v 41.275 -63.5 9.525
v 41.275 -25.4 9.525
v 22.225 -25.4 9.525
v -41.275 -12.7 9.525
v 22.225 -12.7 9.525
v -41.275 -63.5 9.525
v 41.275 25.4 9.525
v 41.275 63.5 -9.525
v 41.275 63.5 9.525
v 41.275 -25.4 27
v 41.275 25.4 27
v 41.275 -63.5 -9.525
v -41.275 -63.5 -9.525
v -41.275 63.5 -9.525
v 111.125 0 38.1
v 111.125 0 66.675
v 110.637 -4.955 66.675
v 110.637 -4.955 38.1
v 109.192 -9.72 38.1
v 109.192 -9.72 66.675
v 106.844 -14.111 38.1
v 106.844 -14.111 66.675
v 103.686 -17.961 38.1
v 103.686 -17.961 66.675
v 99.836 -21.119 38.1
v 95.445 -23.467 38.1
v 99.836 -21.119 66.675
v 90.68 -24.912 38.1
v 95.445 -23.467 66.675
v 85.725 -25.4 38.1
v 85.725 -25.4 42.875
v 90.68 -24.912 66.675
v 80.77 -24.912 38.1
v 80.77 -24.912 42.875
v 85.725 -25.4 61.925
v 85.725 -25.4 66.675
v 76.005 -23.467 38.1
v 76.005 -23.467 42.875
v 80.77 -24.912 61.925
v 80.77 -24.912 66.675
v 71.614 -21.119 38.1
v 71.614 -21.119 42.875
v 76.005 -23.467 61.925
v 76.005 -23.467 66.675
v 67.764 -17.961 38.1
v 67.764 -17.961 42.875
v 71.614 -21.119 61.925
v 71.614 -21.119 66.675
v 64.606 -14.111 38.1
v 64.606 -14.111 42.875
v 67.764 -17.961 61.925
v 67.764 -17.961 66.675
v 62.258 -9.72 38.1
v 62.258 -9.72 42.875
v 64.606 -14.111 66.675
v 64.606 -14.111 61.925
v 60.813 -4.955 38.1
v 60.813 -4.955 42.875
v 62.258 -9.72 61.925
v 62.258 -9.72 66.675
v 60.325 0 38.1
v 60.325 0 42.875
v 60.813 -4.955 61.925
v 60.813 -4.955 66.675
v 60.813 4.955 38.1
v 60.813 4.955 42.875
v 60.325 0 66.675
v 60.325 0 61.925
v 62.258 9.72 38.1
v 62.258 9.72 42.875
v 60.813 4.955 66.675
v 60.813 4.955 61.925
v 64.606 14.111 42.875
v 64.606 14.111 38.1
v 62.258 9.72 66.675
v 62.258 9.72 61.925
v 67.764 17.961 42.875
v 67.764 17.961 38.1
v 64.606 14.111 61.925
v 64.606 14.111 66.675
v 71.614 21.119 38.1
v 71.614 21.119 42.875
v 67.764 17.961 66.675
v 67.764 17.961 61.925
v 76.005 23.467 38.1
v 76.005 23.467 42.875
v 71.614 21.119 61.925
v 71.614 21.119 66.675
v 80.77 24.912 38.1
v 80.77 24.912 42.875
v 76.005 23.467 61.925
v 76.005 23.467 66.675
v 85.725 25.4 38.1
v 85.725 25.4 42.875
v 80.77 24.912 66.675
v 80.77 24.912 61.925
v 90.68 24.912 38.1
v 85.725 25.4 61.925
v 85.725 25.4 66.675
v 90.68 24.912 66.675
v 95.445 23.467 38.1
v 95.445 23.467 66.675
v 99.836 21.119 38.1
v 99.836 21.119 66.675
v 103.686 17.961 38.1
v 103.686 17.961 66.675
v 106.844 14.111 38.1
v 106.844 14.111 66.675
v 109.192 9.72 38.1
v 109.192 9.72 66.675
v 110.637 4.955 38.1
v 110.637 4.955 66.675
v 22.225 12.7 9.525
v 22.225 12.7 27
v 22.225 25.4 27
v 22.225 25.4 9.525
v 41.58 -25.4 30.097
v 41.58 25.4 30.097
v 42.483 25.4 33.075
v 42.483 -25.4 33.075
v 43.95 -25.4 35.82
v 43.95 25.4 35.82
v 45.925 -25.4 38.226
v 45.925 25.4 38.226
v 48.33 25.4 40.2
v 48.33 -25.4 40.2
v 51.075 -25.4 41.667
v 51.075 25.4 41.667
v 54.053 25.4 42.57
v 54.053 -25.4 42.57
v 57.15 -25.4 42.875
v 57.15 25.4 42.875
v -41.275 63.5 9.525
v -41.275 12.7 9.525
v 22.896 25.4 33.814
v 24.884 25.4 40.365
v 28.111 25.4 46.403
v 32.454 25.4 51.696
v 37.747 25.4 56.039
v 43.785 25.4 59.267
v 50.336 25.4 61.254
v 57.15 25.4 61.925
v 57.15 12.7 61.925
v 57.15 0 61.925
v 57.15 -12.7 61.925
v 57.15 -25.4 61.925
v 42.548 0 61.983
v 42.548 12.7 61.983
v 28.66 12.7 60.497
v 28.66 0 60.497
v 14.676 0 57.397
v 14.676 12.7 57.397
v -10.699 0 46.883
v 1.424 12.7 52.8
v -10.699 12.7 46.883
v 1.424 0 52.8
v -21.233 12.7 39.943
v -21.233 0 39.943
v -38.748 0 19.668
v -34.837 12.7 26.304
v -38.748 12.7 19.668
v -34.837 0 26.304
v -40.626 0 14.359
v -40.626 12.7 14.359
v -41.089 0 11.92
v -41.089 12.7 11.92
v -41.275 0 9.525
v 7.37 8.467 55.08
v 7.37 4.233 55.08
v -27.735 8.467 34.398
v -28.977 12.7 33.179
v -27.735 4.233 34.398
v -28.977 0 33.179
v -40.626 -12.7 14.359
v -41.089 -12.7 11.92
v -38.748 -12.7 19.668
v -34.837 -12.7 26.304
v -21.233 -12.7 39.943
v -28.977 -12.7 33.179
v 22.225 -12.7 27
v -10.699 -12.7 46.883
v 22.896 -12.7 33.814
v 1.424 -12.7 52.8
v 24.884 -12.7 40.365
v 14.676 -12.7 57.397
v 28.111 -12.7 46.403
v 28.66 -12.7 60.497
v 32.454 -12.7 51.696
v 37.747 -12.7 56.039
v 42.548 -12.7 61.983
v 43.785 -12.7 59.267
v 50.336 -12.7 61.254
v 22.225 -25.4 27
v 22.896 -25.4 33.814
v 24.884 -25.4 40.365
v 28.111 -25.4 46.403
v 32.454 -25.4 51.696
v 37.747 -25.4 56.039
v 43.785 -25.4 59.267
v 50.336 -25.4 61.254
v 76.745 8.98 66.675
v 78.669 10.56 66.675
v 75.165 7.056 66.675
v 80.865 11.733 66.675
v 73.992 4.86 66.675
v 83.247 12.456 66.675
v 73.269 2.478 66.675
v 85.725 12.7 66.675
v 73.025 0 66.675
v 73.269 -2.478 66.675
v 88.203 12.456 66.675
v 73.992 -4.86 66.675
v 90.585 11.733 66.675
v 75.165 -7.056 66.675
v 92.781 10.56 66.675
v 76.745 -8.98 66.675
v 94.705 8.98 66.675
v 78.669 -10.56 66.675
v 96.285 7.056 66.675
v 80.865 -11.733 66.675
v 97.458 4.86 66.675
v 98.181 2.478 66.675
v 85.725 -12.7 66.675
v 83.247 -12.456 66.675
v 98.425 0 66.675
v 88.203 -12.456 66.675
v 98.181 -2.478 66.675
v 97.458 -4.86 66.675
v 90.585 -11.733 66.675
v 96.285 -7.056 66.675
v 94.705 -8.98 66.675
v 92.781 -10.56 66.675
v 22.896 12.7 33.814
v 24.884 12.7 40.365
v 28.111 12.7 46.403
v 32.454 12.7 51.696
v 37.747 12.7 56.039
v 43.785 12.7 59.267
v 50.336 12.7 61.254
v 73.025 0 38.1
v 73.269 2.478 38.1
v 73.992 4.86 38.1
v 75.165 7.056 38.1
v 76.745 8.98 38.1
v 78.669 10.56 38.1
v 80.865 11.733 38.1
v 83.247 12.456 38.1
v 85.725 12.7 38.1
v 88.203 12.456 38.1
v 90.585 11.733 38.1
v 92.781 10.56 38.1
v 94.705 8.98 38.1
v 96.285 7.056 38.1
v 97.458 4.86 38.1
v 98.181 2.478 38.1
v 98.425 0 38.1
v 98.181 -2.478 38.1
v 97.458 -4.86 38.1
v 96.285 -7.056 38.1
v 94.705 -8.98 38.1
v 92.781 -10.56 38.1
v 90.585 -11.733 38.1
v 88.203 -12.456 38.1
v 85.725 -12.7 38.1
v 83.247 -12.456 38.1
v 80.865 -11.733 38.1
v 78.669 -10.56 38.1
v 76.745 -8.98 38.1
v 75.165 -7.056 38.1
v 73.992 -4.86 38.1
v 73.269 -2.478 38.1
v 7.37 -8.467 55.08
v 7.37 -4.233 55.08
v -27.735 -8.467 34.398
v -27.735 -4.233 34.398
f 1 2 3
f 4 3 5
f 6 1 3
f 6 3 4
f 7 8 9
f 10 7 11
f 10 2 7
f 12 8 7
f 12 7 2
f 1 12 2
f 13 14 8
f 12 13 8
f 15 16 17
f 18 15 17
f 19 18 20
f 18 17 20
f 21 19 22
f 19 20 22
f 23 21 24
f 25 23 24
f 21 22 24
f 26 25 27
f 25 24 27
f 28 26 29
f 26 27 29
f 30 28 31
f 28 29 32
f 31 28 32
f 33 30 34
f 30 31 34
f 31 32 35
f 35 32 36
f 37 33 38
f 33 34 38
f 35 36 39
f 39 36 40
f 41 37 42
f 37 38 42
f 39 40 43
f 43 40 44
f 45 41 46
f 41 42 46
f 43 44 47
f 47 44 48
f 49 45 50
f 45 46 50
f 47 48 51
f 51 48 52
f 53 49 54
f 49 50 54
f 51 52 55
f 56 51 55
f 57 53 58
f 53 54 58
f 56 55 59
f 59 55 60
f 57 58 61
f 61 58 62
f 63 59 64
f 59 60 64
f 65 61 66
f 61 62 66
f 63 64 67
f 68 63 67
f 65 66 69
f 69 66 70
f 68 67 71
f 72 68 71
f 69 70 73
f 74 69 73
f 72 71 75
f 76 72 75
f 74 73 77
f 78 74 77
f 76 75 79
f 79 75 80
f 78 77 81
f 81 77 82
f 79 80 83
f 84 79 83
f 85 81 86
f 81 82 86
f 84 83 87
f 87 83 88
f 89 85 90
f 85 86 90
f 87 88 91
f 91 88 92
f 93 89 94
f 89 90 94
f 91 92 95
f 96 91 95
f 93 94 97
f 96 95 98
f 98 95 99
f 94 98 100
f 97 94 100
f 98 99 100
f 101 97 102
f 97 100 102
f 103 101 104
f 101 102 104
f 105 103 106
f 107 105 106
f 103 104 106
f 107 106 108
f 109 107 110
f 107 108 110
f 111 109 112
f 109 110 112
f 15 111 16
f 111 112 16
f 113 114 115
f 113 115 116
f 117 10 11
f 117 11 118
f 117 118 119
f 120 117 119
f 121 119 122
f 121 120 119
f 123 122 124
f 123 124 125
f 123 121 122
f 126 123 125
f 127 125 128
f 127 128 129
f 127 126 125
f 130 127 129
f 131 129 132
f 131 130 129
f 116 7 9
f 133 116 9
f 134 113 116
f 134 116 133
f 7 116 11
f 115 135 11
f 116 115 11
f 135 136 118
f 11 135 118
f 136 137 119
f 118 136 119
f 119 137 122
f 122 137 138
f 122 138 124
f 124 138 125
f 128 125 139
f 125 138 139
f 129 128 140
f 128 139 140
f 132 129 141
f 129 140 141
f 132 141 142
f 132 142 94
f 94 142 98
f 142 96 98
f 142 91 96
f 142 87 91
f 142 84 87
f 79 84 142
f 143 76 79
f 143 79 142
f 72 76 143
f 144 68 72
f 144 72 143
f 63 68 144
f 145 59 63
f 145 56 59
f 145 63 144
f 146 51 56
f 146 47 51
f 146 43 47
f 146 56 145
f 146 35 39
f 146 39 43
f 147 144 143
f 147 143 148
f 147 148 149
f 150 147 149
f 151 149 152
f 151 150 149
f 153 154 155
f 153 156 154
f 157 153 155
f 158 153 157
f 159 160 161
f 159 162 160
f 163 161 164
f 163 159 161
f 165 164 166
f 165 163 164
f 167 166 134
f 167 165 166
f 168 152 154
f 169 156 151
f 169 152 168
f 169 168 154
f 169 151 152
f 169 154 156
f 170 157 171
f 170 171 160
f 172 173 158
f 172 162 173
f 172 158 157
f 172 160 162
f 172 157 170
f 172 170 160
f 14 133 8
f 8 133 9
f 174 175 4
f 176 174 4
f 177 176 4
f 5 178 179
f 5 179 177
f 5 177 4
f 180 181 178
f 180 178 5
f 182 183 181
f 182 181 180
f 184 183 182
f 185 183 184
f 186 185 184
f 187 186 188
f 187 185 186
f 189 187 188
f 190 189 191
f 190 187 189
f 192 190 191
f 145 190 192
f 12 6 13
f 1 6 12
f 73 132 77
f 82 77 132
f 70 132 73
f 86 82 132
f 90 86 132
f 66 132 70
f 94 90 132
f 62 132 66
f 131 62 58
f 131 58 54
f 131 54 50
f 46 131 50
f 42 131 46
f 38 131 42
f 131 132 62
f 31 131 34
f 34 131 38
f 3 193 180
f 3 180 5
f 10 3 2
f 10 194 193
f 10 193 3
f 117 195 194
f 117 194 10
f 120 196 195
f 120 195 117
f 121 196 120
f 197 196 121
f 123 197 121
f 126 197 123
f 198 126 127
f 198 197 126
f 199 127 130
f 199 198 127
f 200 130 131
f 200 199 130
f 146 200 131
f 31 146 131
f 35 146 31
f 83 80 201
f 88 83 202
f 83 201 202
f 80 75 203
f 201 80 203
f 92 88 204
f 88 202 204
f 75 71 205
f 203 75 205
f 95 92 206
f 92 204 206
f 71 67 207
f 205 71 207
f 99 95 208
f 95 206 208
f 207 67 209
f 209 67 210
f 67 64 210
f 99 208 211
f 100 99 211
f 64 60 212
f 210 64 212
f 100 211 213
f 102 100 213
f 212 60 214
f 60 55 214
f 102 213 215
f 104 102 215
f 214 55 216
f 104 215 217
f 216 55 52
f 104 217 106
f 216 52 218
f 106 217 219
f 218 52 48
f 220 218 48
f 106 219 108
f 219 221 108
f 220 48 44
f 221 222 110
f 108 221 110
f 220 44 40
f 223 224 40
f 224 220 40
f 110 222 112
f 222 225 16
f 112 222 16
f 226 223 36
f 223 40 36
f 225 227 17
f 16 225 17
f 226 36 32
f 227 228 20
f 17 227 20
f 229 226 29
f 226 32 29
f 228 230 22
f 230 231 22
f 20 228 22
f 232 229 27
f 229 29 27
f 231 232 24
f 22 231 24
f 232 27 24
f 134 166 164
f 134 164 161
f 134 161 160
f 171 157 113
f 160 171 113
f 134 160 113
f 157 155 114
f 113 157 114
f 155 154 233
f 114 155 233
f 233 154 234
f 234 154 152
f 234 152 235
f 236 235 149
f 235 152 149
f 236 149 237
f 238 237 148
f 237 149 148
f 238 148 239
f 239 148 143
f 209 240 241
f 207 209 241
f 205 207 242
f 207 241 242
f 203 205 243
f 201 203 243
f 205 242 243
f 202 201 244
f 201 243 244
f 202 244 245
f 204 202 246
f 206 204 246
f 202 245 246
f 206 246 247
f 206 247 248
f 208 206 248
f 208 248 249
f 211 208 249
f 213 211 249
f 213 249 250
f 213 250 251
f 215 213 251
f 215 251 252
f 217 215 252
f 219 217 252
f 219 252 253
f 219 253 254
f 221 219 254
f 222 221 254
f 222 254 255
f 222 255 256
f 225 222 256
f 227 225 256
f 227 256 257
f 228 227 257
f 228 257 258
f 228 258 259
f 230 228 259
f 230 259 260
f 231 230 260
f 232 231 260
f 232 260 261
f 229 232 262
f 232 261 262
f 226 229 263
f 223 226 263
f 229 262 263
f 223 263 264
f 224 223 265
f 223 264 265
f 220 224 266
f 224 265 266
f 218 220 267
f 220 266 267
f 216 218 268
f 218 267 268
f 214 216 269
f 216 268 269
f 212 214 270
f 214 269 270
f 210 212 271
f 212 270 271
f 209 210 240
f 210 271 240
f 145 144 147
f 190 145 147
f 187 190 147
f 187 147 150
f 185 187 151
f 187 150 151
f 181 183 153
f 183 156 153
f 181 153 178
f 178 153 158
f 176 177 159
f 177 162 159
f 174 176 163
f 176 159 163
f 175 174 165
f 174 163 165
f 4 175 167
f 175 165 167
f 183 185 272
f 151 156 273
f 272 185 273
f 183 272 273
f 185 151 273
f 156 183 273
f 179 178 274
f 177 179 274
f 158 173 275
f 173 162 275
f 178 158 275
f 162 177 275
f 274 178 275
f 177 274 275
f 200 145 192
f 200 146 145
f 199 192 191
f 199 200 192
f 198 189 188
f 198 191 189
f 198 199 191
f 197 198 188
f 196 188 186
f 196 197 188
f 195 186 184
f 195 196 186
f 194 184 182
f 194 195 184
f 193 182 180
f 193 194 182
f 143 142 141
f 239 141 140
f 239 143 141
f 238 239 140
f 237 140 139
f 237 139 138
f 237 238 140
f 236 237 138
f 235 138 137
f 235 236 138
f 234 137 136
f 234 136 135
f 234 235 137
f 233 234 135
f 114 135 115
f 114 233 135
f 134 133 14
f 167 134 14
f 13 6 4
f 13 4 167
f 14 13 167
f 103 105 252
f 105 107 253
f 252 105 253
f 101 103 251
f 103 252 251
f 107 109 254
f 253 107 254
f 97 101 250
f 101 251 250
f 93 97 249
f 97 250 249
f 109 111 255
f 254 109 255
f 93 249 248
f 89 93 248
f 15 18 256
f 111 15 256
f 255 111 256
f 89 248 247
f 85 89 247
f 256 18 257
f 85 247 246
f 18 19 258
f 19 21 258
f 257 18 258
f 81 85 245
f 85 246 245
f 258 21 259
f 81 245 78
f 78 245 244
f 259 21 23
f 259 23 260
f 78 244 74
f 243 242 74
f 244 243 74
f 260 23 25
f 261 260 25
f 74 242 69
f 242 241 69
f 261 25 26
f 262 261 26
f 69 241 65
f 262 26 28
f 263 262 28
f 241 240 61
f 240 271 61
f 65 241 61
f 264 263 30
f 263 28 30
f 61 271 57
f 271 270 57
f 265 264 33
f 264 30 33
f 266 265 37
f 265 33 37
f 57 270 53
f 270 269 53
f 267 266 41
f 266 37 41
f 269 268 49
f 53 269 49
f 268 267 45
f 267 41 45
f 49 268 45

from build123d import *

# Parameters (mm, degrees)
F1_DEPTH = 63.5
F0_W     = 25.4
F0_H     = 19.05
F2_DEPTH = 25.4
F3_DEPTH = 12.7
F6_D     = 25.4


with BuildPart() as f1:
    # F0 (on Front) → F1 (new body, symmetric)
    with BuildSketch(Plane.XZ):
        Polygon((41.275, -9.525), (41.275, 9.525), (22.225, 9.525), (-41.275, 9.525), (-41.275, -9.525), align=None)
    extrude(amount=F1_DEPTH, both=True)

    # F0 (on Front) → F2 (join, symmetric)
    with BuildSketch(Plane.XZ):
        with BuildLine():
            Line((22.225, 9.525), (41.275, 9.525))
            Line((41.275, 9.525), (41.275, 27.0002))
            ThreePointArc((41.275, 27.0002), (45.9246798487, 38.2255201513), (57.15, 42.8752))
            Line((57.15, 42.8752), (60.325, 42.8752))
            Line((60.325, 42.8752), (60.325, 61.9252))
            Line((60.325, 61.9252), (57.15, 61.9252))
            ThreePointArc((57.15, 61.9252), (32.4542956671, 51.6959043329), (22.225, 27.0002))
            Line((22.225, 27.0002), (22.225, 9.525))
        make_face()
        with Locations((73.025, 52.4002)):
            Rectangle(F0_W, F0_H)
    extrude(amount=F2_DEPTH, both=True)

    # F0 (on Front) → F3 (join, symmetric)
    with BuildSketch(Plane.XZ):
        with BuildLine():
            Line((-41.275, 9.525), (22.225, 9.525))
            Line((22.225, 9.525), (22.225, 27.0002))
            ThreePointArc((22.225, 27.0002), (32.4542956671, 51.6959043329), (57.15, 61.9252))
            add(Edge.make_bspline(
                [(57.15, 61.9252), (2.3303949274, 65.2119144797), (-40.8146418631, 33.2797057927), (-41.275, 9.525)],
                knots=[0, 0, 0, 0, 111.5045361635, 111.5045361635, 111.5045361635, 111.5045361635], degree=3))
        make_face()
    extrude(amount=F3_DEPTH, both=True)

    # F0 (on Front) → F4 (revolve)
    with BuildSketch(Plane.XZ):
        Polygon((85.725, 61.9252), (85.725, 42.8752), (85.725, 38.1), (111.125, 38.1), (111.125, 66.675), (85.725, 66.675), align=None)
    revolve(axis=Axis((85.725, 0, 52.3875), (0, 0, -1)))

    # F6 (through all)
    with Locations(Plane.XY.offset(66.675)):
        with Locations((85.725, 0)):
            Hole(F6_D / 2)


solid = f1.part
